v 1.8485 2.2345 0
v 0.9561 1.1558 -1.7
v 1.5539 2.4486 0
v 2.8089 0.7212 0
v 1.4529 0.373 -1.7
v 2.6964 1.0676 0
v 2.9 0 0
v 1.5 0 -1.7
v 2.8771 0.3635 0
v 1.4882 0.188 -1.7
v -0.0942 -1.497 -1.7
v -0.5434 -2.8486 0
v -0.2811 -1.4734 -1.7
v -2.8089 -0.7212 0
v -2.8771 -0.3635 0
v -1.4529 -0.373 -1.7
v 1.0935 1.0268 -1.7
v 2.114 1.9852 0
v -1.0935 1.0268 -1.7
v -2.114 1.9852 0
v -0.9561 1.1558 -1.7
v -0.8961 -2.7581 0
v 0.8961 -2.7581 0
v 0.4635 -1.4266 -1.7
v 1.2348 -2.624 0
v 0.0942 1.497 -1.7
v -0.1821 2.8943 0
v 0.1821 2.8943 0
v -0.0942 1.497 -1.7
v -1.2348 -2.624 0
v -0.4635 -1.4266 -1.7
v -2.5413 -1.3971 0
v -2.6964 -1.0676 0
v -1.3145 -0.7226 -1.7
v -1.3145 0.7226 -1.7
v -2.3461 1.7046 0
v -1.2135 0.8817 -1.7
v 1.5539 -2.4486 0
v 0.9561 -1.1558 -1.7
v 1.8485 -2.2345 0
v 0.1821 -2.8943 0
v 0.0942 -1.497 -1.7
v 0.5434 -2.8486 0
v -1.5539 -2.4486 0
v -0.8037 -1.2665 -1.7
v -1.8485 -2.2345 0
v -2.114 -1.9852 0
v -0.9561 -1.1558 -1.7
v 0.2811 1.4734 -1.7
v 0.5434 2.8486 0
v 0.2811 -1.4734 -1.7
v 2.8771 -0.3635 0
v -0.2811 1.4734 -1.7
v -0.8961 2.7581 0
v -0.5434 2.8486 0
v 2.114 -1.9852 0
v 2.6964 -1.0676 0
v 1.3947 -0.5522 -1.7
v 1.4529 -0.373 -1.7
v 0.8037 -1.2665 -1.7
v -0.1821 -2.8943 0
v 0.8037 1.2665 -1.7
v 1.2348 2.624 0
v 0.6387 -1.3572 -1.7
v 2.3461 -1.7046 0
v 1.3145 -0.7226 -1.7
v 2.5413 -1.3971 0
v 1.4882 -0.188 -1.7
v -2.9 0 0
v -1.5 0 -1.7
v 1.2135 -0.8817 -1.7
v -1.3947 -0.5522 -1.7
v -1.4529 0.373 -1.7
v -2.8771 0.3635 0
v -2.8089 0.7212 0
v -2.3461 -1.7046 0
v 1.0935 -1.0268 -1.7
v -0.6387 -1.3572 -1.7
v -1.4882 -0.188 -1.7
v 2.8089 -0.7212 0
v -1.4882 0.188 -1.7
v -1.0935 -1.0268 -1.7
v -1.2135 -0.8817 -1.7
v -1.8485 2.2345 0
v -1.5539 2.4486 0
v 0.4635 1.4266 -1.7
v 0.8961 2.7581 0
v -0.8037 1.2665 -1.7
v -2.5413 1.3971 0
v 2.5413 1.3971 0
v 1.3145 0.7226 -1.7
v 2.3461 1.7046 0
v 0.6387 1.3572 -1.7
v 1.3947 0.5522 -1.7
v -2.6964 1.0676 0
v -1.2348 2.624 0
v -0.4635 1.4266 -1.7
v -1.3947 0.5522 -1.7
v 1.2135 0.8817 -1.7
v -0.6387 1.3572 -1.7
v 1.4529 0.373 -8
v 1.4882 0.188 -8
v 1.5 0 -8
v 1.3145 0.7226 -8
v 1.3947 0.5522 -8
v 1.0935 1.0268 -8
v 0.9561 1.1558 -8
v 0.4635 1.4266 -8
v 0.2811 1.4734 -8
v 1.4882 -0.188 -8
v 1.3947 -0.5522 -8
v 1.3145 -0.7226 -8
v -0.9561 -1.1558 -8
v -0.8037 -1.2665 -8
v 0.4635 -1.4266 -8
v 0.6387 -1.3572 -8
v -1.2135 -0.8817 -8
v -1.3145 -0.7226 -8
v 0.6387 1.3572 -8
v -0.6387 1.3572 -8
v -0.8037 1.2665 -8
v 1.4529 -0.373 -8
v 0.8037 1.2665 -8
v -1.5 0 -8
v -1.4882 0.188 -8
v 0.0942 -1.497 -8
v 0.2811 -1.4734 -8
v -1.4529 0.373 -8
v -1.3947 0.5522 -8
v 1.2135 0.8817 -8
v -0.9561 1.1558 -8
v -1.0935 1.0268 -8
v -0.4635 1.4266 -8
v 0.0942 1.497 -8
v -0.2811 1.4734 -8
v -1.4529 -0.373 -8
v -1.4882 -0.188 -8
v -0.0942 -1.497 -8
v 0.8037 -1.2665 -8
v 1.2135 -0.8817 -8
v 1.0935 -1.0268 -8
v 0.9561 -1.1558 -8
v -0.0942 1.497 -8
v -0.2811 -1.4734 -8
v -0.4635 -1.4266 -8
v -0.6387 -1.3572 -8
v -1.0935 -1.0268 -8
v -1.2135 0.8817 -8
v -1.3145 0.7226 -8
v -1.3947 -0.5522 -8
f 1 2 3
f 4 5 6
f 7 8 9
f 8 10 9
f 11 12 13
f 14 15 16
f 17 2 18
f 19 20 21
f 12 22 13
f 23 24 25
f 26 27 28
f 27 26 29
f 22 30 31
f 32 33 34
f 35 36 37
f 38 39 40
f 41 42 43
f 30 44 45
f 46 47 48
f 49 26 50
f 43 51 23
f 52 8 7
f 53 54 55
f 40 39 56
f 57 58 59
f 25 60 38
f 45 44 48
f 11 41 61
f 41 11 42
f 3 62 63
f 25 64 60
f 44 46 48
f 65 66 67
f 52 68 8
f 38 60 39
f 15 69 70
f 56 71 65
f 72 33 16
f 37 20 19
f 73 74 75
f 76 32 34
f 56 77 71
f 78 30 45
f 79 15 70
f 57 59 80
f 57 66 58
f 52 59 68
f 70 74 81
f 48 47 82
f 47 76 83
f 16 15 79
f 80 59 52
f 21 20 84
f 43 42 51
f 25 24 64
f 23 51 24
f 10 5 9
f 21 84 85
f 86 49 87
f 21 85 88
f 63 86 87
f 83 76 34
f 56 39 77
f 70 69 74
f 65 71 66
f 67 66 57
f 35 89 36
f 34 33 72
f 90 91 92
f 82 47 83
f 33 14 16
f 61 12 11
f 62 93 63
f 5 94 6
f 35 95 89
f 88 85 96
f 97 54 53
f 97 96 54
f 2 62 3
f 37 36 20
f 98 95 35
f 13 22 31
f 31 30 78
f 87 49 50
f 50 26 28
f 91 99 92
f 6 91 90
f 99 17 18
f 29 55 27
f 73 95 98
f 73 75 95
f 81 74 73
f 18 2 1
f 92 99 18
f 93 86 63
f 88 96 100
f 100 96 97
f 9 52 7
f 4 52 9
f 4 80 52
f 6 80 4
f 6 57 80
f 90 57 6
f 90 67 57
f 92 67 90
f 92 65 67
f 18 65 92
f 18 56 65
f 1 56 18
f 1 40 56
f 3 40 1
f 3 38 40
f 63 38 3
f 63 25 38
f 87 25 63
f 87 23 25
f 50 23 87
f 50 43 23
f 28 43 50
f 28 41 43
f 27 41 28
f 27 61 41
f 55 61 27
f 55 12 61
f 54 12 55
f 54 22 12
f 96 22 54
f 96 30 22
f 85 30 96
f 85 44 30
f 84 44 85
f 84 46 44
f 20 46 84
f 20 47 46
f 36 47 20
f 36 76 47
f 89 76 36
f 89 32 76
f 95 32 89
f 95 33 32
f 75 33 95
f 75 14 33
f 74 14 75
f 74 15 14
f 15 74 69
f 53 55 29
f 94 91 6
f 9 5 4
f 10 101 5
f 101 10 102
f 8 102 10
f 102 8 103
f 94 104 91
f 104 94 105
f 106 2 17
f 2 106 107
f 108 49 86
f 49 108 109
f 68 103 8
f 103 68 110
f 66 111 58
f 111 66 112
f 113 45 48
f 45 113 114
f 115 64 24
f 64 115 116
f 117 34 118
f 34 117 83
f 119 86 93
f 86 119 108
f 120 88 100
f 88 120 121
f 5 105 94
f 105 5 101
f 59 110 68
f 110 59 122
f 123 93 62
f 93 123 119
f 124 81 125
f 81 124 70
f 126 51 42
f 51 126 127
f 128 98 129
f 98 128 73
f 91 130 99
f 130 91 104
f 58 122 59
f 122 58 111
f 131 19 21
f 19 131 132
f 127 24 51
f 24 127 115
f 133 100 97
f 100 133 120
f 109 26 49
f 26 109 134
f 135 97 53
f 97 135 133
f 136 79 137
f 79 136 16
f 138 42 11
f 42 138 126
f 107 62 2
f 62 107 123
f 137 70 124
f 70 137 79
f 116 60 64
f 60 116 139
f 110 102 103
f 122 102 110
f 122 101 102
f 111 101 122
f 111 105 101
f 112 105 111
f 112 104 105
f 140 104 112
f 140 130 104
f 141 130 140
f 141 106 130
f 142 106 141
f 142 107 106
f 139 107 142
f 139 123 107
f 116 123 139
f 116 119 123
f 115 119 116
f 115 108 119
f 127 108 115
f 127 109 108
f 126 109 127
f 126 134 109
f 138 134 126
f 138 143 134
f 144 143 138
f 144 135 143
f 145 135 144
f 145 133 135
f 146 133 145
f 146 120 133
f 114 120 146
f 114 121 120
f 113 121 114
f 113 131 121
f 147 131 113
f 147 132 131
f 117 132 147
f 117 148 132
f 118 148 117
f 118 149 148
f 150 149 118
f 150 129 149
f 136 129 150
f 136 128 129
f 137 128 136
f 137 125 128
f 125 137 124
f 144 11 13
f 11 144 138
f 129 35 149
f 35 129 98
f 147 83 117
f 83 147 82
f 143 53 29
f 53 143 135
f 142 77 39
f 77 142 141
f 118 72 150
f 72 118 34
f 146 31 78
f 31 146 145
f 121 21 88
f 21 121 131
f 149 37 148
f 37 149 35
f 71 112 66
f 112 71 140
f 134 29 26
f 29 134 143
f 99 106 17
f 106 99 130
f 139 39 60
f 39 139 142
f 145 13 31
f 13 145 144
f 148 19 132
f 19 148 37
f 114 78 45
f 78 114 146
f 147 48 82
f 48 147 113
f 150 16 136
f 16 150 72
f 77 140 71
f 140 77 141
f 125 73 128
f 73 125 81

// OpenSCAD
$fn = 50;


difference() {
	union() {
		translate(v = [0, 0, -1.7000000000]) {
			rotate(a = [0, 0, 0]) {
				cylinder(h = 1.7000000000, r1 = 1.5000000000, r2 = 2.9000000000);
			}
		}
		translate(v = [0, 0, -8]) {
			rotate(a = [0, 0, 0]) {
				cylinder(h = 8, r = 1.5000000000);
			}
		}
	}
	union();
}
